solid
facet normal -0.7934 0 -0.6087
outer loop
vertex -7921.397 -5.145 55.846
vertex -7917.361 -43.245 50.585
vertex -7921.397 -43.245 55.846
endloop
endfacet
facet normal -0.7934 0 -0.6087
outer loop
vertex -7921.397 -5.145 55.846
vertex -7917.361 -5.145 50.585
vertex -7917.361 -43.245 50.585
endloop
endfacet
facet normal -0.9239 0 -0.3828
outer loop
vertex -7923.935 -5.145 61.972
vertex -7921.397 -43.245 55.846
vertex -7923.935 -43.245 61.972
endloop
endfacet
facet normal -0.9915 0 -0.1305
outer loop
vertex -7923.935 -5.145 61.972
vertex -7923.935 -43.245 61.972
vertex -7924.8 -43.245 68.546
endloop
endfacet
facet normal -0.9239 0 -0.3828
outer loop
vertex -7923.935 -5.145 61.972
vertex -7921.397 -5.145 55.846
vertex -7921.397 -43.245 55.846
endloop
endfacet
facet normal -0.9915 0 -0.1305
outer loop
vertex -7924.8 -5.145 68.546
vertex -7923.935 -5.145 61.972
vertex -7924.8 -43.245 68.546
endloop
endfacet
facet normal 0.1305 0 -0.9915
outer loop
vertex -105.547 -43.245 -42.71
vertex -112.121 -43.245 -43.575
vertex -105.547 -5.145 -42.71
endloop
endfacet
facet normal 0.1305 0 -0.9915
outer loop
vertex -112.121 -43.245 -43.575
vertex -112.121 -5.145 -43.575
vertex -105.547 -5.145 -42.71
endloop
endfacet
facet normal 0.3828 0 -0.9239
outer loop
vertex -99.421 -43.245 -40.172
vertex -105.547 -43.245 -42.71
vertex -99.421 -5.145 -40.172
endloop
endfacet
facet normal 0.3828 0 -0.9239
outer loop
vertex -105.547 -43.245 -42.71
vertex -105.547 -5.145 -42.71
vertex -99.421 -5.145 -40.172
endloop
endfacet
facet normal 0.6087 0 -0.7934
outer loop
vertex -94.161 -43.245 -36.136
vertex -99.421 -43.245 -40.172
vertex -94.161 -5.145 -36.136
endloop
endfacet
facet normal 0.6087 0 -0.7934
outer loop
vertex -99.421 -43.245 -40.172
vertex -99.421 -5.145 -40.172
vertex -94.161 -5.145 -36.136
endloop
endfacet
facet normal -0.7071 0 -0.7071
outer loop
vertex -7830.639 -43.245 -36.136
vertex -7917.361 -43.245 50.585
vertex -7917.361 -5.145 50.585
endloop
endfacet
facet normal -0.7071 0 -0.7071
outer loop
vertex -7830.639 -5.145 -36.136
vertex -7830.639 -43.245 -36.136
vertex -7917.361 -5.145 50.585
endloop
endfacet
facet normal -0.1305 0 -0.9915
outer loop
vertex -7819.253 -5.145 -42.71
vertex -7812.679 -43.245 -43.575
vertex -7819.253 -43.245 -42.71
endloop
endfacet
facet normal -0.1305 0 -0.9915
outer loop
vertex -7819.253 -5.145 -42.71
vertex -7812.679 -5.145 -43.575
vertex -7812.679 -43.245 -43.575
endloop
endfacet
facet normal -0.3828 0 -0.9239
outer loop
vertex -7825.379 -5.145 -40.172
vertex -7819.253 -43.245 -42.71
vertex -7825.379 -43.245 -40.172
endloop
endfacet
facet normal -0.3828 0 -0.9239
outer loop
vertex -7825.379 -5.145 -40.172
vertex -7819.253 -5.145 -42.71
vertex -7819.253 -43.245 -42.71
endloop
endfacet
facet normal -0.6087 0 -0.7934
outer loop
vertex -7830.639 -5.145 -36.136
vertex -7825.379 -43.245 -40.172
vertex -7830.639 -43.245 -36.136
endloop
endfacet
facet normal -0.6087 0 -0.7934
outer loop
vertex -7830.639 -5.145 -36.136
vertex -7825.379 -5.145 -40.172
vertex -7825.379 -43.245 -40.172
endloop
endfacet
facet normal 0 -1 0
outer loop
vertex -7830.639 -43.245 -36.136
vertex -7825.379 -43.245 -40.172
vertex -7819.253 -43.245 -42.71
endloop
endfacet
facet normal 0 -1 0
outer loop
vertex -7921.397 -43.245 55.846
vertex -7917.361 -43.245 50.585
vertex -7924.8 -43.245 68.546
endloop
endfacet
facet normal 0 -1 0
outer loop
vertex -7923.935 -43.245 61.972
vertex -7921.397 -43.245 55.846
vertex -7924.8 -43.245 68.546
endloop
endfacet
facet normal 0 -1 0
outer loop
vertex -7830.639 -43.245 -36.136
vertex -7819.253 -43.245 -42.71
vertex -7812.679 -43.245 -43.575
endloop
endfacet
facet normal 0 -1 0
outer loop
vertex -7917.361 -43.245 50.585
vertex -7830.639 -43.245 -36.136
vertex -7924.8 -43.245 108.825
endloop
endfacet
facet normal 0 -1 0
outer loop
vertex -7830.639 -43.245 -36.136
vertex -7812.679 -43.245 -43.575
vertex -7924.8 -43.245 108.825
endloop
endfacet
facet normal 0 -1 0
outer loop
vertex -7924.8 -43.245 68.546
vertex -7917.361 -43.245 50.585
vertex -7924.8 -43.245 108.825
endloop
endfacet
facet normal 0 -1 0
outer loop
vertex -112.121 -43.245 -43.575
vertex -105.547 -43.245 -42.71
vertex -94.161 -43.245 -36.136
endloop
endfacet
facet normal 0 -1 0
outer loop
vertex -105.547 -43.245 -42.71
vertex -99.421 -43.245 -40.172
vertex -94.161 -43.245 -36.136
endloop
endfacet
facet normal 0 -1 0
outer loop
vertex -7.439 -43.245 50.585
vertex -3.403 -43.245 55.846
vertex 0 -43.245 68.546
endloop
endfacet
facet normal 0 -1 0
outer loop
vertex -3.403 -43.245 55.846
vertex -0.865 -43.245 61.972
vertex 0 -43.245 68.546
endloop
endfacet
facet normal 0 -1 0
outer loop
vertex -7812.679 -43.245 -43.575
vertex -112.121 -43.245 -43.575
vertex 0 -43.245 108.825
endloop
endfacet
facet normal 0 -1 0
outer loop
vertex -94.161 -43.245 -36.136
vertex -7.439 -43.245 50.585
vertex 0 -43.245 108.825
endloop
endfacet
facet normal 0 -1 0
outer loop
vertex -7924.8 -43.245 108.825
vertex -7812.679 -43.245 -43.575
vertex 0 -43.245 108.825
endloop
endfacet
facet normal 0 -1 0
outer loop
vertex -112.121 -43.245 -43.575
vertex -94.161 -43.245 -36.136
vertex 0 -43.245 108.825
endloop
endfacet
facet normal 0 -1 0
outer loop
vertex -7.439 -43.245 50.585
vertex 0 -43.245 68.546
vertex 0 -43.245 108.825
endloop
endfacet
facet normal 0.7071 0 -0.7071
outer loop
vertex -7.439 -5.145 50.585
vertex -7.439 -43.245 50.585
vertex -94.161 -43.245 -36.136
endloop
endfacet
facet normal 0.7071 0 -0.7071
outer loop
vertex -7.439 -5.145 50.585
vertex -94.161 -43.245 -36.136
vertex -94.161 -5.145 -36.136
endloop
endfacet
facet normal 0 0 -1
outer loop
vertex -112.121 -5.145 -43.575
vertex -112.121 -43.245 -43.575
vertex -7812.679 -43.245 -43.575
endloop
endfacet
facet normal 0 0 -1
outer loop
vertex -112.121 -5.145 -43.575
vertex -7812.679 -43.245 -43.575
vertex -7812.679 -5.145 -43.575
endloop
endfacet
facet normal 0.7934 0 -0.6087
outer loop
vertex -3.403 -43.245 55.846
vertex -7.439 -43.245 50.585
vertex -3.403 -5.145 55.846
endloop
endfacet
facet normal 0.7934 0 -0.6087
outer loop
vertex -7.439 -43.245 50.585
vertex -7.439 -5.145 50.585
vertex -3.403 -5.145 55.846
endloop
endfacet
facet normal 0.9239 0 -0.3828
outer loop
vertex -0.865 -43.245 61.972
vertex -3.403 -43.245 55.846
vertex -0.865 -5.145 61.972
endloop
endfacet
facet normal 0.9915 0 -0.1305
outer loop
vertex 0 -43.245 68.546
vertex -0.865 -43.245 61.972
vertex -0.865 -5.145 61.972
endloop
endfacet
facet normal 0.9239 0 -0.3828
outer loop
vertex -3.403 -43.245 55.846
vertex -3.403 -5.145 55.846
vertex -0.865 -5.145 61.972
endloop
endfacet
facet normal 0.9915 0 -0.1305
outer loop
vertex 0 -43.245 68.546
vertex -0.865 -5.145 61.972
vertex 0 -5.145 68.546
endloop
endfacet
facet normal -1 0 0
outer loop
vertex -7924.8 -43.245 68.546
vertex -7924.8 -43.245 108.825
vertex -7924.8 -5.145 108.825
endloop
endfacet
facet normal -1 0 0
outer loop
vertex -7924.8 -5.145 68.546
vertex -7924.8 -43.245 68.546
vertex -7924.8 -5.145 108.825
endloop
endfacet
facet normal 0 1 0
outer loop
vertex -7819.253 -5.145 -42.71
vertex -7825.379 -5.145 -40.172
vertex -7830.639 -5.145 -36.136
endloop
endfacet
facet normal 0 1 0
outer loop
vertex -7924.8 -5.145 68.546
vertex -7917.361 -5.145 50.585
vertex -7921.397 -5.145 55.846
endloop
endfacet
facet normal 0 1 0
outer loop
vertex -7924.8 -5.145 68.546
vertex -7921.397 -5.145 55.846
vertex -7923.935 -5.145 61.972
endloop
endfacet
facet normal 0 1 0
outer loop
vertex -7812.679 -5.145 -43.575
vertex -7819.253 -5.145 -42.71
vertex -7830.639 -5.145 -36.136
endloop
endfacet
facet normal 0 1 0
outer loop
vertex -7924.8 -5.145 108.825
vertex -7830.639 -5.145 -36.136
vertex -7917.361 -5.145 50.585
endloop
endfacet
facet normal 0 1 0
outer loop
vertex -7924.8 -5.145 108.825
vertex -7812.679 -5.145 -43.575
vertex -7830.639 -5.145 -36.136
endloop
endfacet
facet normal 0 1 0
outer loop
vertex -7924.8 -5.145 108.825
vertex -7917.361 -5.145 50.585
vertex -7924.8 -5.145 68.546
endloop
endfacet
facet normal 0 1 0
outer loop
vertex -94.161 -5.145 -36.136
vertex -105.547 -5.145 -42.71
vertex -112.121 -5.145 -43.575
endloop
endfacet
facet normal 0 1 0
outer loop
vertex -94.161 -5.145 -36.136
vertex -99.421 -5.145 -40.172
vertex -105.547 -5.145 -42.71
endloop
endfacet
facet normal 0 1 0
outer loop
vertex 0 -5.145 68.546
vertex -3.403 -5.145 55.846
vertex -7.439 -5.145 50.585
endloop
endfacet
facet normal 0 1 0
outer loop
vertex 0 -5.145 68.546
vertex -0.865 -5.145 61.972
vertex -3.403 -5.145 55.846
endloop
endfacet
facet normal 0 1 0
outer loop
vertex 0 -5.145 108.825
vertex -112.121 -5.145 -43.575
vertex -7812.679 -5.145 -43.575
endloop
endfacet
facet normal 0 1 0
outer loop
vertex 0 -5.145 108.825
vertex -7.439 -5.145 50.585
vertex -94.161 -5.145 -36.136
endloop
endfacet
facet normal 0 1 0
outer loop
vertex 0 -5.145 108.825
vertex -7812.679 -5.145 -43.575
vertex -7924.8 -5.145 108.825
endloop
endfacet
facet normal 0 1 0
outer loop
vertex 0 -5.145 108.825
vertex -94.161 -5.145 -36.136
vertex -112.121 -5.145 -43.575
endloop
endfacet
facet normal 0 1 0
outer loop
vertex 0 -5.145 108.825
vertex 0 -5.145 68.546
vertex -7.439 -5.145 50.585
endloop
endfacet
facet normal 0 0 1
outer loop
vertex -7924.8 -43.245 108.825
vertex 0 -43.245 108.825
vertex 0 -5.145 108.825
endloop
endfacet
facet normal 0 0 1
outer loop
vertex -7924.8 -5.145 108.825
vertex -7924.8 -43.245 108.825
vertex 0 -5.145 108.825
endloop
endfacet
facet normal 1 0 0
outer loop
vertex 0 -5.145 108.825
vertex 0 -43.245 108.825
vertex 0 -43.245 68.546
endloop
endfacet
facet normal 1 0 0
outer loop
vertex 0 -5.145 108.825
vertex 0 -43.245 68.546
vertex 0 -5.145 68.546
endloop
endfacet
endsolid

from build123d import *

# Parameters (mm, degrees)
F0_W     = 38.1
F0_H     = 152.4
F1_DEPTH = 7924.8
F2_SIZE  = 101.6
F3_R     = 25.4


with BuildPart() as f1:
    # F0 (on Right) → F1 (new body)
    with BuildSketch(Plane.YZ):
        with Locations((-24.1951760836, 32.6246434903)):
            Rectangle(F0_W, F0_H)
    extrude(amount=-F1_DEPTH)

    # F2
    f2_edges = [f1.edges().sort_by_distance(p)[0] for p in [
        (0, -24.195176, -43.575357),
        (-7924.8, -24.195176, -43.575357),
    ]]
    chamfer(f2_edges, length=F2_SIZE)

    # F3
    f3_edges = [f1.edges().sort_by_distance(p)[0] for p in [
        (0, -24.195176, 58.024643),
        (-101.6, -24.195176, -43.575357),
        (-7924.8, -24.195176, 58.024643),
        (-7823.2, -24.195176, -43.575357),
    ]]
    fillet(f3_edges, radius=F3_R)


solid = f1.part
